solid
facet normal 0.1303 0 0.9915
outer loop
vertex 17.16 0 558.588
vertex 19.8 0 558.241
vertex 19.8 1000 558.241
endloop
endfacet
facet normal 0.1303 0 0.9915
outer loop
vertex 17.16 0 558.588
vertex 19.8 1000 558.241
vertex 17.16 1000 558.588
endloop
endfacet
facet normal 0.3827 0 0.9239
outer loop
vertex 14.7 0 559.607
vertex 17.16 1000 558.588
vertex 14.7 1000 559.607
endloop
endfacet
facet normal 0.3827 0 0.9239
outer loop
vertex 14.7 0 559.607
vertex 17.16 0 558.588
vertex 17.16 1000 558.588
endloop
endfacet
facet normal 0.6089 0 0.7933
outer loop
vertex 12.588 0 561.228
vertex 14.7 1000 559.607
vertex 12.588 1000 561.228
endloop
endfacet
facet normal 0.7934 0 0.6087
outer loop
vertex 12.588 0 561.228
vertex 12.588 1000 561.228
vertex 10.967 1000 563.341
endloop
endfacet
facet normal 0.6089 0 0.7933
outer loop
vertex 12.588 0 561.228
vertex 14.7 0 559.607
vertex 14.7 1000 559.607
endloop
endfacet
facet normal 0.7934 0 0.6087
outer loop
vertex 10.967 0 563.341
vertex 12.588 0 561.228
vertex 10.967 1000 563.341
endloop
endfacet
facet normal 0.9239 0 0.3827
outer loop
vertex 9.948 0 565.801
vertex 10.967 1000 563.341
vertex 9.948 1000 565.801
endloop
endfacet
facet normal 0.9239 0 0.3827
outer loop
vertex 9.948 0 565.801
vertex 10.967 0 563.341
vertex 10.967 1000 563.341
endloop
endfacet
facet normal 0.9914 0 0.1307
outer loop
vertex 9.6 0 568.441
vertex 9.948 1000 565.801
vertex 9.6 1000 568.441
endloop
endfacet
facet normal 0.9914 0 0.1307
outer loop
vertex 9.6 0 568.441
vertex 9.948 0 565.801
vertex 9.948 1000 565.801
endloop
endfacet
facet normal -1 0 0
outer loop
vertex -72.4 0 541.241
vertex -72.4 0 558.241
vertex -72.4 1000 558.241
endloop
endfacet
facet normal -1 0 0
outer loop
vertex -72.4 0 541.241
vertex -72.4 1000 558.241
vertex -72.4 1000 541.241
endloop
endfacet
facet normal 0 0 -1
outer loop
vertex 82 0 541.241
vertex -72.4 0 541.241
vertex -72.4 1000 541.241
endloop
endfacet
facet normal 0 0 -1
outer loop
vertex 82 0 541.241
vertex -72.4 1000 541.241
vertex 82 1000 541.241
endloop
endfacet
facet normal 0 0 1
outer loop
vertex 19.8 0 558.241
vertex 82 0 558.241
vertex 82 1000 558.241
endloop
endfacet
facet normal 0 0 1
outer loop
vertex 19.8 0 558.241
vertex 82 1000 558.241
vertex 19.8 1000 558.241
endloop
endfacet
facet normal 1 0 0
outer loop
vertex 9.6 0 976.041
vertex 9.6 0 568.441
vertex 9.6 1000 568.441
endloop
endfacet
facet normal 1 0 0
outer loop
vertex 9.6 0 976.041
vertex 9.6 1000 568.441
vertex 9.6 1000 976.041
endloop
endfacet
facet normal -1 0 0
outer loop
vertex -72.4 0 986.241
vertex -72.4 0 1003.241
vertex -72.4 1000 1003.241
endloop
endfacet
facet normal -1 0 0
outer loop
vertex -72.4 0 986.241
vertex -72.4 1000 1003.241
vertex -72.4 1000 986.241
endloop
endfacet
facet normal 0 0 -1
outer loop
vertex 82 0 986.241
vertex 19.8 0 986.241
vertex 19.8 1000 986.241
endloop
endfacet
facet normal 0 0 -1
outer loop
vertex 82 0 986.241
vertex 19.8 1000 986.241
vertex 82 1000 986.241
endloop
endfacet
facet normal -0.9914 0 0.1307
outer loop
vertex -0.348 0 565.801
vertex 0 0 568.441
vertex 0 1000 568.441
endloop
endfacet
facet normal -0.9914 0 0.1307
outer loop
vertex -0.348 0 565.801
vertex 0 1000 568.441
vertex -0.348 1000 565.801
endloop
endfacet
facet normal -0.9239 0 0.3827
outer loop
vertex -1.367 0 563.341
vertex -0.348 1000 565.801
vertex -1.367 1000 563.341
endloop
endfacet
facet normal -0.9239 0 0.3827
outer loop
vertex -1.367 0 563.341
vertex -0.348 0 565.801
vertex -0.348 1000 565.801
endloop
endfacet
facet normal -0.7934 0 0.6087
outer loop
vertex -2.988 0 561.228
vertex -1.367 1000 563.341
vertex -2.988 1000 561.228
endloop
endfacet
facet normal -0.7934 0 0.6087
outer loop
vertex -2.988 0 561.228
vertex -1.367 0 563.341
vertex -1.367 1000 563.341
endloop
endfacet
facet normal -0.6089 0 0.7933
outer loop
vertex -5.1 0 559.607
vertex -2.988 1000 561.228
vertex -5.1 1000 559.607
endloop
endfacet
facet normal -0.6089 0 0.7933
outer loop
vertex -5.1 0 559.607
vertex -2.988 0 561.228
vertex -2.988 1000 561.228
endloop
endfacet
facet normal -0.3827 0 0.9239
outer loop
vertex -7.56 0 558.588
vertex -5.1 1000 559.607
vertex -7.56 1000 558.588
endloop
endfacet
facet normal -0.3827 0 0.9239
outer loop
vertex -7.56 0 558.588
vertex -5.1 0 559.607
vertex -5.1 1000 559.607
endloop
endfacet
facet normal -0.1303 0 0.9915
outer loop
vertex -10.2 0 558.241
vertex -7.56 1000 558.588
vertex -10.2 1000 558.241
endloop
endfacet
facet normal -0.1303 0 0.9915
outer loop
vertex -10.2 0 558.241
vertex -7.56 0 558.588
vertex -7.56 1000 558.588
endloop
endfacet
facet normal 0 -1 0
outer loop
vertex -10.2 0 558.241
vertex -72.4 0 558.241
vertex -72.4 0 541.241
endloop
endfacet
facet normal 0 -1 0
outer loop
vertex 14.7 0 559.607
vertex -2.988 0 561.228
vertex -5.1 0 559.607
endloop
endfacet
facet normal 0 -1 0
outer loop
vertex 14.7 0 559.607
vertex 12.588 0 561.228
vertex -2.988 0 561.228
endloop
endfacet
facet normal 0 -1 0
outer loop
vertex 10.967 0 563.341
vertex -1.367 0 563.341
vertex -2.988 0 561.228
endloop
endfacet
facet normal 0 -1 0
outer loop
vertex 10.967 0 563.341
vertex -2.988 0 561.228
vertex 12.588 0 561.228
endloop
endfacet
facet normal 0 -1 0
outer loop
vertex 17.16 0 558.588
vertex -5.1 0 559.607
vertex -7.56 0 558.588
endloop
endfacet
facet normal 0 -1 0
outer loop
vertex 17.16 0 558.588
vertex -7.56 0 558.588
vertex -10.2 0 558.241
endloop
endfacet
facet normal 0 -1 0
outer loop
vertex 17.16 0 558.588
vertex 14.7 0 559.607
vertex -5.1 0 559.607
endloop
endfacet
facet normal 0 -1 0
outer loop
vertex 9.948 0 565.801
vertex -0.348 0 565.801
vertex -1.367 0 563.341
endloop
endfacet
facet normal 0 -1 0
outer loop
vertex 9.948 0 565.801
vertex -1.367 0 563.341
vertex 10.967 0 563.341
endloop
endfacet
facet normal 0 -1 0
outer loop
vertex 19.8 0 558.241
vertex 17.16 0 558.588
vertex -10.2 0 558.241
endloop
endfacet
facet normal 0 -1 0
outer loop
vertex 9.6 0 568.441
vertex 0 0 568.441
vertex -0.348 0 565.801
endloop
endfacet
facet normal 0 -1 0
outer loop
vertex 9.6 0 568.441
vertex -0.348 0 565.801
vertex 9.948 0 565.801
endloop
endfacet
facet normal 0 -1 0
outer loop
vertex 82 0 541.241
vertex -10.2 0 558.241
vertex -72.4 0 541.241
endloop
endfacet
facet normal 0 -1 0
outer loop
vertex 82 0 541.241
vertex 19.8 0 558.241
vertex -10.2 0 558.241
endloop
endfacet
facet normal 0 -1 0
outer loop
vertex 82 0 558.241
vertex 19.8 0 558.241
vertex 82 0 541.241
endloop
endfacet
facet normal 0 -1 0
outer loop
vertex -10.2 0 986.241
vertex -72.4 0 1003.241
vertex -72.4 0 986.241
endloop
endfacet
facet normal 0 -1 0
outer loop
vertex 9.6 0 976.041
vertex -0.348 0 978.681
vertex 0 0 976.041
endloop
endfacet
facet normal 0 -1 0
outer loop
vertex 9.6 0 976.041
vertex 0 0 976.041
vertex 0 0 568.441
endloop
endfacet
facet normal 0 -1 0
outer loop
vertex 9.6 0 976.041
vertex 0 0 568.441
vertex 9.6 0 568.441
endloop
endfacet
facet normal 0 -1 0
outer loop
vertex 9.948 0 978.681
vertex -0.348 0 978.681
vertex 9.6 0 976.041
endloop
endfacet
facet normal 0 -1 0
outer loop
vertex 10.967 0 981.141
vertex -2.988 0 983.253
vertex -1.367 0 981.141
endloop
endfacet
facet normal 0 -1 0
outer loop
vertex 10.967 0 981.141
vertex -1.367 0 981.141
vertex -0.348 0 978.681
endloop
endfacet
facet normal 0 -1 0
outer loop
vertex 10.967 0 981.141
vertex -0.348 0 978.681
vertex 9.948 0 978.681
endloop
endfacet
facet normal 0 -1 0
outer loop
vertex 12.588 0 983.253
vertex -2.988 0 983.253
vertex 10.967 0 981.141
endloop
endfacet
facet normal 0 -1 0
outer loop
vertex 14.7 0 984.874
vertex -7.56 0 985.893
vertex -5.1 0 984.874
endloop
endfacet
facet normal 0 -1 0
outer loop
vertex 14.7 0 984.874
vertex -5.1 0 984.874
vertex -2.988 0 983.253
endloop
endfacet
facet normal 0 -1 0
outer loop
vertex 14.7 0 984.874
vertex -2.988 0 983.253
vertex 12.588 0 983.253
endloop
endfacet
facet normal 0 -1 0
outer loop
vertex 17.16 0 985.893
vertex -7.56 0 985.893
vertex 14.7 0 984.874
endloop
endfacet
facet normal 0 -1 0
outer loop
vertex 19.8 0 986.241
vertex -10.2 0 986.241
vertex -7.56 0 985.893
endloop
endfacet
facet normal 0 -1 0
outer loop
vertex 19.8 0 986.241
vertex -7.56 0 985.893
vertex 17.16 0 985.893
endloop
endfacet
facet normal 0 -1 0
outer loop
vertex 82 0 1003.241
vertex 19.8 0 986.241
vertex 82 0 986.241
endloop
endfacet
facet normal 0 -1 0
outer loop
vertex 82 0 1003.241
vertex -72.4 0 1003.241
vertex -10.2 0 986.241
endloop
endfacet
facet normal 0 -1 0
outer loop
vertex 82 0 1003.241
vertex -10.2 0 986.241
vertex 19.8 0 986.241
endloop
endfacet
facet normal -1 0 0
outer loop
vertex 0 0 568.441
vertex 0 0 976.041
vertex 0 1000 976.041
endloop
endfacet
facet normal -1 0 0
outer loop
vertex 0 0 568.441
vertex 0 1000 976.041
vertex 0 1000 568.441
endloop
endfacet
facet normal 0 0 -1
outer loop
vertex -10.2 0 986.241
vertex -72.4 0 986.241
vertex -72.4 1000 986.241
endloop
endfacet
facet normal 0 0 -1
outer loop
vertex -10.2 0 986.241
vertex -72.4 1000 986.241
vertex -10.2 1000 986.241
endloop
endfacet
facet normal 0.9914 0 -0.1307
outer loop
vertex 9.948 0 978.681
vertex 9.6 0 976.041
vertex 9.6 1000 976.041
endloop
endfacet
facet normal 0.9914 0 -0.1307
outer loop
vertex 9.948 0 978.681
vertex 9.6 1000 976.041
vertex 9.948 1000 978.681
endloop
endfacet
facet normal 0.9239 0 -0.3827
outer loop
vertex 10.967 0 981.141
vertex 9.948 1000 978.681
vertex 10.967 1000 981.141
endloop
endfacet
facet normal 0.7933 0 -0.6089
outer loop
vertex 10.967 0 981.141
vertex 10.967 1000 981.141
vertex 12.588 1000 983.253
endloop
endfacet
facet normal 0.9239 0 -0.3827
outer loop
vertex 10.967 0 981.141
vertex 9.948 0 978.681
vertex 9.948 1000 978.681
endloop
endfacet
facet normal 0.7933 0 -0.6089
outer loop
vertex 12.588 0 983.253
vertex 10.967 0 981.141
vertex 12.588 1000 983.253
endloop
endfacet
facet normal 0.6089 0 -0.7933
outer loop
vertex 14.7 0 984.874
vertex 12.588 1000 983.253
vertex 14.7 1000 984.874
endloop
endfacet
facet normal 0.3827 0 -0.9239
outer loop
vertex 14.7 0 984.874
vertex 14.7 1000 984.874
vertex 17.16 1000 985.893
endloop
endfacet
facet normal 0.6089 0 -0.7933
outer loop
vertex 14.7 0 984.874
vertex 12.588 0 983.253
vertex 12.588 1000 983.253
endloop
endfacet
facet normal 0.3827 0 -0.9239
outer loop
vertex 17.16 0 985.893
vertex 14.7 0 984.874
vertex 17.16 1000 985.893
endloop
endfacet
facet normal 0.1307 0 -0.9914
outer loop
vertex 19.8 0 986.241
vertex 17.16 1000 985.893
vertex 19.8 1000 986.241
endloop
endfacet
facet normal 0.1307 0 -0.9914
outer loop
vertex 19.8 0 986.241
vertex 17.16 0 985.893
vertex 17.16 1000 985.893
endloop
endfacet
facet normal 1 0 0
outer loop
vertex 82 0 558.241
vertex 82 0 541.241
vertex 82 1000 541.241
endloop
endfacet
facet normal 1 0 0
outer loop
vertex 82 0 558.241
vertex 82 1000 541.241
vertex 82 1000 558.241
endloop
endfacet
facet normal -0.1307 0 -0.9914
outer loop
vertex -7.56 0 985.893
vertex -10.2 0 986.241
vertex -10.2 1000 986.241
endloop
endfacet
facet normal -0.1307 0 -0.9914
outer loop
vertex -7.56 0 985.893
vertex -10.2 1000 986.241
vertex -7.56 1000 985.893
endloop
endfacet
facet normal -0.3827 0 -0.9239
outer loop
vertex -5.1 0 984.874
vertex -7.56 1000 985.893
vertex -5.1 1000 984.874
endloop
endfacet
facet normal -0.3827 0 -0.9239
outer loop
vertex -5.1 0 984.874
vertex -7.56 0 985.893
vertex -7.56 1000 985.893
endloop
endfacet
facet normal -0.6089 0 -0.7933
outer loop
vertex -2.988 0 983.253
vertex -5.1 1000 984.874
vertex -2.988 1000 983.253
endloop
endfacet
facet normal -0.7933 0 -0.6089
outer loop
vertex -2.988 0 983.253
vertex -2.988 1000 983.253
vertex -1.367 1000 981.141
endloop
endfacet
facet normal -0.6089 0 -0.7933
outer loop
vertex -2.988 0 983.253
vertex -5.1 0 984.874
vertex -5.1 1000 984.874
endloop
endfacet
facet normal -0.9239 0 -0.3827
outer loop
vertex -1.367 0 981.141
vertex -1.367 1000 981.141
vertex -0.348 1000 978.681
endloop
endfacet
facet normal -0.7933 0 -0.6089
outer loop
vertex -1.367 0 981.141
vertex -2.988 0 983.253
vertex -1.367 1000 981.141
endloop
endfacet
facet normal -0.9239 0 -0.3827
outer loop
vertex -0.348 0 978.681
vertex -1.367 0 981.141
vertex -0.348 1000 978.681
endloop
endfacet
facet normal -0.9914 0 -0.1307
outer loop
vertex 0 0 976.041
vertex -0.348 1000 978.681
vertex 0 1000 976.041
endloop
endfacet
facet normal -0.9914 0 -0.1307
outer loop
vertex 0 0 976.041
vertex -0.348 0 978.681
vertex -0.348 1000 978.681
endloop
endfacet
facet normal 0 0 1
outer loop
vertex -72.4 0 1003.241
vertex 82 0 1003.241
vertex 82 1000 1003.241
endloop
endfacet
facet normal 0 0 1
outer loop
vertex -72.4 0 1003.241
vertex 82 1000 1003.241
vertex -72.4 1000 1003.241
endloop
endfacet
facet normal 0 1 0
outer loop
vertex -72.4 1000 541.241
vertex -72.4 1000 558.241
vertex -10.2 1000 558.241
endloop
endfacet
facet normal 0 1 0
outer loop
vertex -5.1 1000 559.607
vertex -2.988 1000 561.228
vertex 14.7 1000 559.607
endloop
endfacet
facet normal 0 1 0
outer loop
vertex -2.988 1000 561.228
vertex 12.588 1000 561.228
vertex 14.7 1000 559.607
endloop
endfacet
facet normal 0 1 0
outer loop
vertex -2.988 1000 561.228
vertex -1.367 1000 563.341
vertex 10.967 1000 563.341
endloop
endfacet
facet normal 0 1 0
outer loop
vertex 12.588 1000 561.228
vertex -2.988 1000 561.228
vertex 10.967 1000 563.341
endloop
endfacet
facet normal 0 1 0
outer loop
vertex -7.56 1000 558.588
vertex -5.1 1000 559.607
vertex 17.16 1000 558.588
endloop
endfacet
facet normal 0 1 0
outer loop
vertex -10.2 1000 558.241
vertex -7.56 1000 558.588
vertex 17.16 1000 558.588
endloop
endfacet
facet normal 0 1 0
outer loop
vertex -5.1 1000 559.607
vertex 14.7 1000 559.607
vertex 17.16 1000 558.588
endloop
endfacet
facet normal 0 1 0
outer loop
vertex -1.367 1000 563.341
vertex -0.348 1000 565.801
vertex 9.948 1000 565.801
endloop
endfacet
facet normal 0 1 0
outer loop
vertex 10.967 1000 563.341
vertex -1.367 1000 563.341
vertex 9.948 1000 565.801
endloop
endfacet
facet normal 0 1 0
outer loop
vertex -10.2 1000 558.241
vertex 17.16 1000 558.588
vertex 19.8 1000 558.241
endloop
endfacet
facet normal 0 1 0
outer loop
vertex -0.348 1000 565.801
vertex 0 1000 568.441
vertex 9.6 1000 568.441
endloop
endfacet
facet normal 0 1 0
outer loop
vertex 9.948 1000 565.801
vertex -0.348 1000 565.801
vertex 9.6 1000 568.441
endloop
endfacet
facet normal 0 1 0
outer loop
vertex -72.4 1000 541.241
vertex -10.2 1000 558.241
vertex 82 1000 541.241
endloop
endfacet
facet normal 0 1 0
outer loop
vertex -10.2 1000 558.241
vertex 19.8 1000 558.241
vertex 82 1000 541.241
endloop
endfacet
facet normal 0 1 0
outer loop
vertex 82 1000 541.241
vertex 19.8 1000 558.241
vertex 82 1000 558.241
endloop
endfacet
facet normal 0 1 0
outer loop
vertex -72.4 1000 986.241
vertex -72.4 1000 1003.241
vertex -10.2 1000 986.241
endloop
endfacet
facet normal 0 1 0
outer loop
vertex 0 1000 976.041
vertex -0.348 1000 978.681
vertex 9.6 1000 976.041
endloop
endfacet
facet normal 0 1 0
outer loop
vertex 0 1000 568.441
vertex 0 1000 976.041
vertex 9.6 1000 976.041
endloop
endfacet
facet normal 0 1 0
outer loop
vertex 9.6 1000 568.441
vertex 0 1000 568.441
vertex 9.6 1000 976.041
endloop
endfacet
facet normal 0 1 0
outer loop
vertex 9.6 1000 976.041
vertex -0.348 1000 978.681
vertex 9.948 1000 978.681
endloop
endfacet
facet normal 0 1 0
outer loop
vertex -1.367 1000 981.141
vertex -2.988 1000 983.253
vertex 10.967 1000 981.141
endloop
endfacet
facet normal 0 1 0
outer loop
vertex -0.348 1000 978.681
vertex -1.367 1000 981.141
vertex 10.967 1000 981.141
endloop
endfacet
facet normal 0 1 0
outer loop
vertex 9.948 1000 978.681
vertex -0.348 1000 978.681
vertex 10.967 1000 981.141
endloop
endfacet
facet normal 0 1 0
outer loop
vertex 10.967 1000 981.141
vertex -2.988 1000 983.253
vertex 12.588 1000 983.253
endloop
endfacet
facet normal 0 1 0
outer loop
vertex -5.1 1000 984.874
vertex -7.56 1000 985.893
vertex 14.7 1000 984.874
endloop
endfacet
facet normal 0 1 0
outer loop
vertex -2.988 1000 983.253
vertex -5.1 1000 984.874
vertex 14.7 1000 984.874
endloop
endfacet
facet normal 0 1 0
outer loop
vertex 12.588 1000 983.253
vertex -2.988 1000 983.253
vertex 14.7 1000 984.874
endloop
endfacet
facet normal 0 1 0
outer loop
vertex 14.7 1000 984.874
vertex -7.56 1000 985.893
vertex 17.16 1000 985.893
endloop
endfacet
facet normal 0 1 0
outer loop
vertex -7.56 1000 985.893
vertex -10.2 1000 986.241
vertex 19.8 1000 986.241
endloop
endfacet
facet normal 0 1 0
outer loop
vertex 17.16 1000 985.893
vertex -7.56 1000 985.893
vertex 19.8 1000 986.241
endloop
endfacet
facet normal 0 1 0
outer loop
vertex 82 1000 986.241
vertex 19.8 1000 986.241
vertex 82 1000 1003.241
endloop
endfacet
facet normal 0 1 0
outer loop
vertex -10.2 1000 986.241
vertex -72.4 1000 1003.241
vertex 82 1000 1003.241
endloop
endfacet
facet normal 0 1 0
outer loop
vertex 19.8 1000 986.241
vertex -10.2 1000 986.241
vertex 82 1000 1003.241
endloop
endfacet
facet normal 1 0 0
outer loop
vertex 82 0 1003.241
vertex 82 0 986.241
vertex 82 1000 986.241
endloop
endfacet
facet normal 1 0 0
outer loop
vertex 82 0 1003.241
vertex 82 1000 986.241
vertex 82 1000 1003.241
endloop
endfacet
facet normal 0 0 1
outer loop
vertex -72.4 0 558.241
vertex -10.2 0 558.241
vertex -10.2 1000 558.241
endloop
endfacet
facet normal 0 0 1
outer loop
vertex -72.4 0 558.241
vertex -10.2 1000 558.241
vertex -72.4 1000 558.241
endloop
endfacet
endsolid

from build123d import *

# Parameters (mm, degrees)
F1_DEPTH = 1000


with BuildPart() as f1:
    # F0 (on Front) → F1 (new body)
    with BuildSketch(Plane.XZ):
        with BuildLine():
            Line((-72.4, 558.240645), (-72.4, 541.240645))
            Line((-72.4, 541.240645), (82, 541.240645))
            Line((82, 541.240645), (82, 558.240645))
            Line((82, 558.240645), (19.8, 558.240645))
            ThreePointArc((19.8, 558.240645), (12.587511, 561.228156), (9.6, 568.440645))
            Line((9.6, 568.440645), (9.6, 976.040645))
            ThreePointArc((9.6, 976.040645), (12.587511, 983.253134), (19.8, 986.240645))
            Line((19.8, 986.240645), (82, 986.240645))
            Line((82, 986.240645), (82, 1003.240645))
            Line((82, 1003.240645), (-72.4, 1003.240645))
            Line((-72.4, 1003.240645), (-72.4, 986.240645))
            Line((-72.4, 986.240645), (-10.2, 986.240645))
            ThreePointArc((-10.2, 986.240645), (-2.987511, 983.253134), (0, 976.040645))
            Line((0, 976.040645), (0, 568.440645))
            ThreePointArc((0, 568.440645), (-2.987511, 561.228156), (-10.2, 558.240645))
            Line((-10.2, 558.240645), (-72.4, 558.240645))
        make_face()
    extrude(amount=-F1_DEPTH)


solid = f1.part
